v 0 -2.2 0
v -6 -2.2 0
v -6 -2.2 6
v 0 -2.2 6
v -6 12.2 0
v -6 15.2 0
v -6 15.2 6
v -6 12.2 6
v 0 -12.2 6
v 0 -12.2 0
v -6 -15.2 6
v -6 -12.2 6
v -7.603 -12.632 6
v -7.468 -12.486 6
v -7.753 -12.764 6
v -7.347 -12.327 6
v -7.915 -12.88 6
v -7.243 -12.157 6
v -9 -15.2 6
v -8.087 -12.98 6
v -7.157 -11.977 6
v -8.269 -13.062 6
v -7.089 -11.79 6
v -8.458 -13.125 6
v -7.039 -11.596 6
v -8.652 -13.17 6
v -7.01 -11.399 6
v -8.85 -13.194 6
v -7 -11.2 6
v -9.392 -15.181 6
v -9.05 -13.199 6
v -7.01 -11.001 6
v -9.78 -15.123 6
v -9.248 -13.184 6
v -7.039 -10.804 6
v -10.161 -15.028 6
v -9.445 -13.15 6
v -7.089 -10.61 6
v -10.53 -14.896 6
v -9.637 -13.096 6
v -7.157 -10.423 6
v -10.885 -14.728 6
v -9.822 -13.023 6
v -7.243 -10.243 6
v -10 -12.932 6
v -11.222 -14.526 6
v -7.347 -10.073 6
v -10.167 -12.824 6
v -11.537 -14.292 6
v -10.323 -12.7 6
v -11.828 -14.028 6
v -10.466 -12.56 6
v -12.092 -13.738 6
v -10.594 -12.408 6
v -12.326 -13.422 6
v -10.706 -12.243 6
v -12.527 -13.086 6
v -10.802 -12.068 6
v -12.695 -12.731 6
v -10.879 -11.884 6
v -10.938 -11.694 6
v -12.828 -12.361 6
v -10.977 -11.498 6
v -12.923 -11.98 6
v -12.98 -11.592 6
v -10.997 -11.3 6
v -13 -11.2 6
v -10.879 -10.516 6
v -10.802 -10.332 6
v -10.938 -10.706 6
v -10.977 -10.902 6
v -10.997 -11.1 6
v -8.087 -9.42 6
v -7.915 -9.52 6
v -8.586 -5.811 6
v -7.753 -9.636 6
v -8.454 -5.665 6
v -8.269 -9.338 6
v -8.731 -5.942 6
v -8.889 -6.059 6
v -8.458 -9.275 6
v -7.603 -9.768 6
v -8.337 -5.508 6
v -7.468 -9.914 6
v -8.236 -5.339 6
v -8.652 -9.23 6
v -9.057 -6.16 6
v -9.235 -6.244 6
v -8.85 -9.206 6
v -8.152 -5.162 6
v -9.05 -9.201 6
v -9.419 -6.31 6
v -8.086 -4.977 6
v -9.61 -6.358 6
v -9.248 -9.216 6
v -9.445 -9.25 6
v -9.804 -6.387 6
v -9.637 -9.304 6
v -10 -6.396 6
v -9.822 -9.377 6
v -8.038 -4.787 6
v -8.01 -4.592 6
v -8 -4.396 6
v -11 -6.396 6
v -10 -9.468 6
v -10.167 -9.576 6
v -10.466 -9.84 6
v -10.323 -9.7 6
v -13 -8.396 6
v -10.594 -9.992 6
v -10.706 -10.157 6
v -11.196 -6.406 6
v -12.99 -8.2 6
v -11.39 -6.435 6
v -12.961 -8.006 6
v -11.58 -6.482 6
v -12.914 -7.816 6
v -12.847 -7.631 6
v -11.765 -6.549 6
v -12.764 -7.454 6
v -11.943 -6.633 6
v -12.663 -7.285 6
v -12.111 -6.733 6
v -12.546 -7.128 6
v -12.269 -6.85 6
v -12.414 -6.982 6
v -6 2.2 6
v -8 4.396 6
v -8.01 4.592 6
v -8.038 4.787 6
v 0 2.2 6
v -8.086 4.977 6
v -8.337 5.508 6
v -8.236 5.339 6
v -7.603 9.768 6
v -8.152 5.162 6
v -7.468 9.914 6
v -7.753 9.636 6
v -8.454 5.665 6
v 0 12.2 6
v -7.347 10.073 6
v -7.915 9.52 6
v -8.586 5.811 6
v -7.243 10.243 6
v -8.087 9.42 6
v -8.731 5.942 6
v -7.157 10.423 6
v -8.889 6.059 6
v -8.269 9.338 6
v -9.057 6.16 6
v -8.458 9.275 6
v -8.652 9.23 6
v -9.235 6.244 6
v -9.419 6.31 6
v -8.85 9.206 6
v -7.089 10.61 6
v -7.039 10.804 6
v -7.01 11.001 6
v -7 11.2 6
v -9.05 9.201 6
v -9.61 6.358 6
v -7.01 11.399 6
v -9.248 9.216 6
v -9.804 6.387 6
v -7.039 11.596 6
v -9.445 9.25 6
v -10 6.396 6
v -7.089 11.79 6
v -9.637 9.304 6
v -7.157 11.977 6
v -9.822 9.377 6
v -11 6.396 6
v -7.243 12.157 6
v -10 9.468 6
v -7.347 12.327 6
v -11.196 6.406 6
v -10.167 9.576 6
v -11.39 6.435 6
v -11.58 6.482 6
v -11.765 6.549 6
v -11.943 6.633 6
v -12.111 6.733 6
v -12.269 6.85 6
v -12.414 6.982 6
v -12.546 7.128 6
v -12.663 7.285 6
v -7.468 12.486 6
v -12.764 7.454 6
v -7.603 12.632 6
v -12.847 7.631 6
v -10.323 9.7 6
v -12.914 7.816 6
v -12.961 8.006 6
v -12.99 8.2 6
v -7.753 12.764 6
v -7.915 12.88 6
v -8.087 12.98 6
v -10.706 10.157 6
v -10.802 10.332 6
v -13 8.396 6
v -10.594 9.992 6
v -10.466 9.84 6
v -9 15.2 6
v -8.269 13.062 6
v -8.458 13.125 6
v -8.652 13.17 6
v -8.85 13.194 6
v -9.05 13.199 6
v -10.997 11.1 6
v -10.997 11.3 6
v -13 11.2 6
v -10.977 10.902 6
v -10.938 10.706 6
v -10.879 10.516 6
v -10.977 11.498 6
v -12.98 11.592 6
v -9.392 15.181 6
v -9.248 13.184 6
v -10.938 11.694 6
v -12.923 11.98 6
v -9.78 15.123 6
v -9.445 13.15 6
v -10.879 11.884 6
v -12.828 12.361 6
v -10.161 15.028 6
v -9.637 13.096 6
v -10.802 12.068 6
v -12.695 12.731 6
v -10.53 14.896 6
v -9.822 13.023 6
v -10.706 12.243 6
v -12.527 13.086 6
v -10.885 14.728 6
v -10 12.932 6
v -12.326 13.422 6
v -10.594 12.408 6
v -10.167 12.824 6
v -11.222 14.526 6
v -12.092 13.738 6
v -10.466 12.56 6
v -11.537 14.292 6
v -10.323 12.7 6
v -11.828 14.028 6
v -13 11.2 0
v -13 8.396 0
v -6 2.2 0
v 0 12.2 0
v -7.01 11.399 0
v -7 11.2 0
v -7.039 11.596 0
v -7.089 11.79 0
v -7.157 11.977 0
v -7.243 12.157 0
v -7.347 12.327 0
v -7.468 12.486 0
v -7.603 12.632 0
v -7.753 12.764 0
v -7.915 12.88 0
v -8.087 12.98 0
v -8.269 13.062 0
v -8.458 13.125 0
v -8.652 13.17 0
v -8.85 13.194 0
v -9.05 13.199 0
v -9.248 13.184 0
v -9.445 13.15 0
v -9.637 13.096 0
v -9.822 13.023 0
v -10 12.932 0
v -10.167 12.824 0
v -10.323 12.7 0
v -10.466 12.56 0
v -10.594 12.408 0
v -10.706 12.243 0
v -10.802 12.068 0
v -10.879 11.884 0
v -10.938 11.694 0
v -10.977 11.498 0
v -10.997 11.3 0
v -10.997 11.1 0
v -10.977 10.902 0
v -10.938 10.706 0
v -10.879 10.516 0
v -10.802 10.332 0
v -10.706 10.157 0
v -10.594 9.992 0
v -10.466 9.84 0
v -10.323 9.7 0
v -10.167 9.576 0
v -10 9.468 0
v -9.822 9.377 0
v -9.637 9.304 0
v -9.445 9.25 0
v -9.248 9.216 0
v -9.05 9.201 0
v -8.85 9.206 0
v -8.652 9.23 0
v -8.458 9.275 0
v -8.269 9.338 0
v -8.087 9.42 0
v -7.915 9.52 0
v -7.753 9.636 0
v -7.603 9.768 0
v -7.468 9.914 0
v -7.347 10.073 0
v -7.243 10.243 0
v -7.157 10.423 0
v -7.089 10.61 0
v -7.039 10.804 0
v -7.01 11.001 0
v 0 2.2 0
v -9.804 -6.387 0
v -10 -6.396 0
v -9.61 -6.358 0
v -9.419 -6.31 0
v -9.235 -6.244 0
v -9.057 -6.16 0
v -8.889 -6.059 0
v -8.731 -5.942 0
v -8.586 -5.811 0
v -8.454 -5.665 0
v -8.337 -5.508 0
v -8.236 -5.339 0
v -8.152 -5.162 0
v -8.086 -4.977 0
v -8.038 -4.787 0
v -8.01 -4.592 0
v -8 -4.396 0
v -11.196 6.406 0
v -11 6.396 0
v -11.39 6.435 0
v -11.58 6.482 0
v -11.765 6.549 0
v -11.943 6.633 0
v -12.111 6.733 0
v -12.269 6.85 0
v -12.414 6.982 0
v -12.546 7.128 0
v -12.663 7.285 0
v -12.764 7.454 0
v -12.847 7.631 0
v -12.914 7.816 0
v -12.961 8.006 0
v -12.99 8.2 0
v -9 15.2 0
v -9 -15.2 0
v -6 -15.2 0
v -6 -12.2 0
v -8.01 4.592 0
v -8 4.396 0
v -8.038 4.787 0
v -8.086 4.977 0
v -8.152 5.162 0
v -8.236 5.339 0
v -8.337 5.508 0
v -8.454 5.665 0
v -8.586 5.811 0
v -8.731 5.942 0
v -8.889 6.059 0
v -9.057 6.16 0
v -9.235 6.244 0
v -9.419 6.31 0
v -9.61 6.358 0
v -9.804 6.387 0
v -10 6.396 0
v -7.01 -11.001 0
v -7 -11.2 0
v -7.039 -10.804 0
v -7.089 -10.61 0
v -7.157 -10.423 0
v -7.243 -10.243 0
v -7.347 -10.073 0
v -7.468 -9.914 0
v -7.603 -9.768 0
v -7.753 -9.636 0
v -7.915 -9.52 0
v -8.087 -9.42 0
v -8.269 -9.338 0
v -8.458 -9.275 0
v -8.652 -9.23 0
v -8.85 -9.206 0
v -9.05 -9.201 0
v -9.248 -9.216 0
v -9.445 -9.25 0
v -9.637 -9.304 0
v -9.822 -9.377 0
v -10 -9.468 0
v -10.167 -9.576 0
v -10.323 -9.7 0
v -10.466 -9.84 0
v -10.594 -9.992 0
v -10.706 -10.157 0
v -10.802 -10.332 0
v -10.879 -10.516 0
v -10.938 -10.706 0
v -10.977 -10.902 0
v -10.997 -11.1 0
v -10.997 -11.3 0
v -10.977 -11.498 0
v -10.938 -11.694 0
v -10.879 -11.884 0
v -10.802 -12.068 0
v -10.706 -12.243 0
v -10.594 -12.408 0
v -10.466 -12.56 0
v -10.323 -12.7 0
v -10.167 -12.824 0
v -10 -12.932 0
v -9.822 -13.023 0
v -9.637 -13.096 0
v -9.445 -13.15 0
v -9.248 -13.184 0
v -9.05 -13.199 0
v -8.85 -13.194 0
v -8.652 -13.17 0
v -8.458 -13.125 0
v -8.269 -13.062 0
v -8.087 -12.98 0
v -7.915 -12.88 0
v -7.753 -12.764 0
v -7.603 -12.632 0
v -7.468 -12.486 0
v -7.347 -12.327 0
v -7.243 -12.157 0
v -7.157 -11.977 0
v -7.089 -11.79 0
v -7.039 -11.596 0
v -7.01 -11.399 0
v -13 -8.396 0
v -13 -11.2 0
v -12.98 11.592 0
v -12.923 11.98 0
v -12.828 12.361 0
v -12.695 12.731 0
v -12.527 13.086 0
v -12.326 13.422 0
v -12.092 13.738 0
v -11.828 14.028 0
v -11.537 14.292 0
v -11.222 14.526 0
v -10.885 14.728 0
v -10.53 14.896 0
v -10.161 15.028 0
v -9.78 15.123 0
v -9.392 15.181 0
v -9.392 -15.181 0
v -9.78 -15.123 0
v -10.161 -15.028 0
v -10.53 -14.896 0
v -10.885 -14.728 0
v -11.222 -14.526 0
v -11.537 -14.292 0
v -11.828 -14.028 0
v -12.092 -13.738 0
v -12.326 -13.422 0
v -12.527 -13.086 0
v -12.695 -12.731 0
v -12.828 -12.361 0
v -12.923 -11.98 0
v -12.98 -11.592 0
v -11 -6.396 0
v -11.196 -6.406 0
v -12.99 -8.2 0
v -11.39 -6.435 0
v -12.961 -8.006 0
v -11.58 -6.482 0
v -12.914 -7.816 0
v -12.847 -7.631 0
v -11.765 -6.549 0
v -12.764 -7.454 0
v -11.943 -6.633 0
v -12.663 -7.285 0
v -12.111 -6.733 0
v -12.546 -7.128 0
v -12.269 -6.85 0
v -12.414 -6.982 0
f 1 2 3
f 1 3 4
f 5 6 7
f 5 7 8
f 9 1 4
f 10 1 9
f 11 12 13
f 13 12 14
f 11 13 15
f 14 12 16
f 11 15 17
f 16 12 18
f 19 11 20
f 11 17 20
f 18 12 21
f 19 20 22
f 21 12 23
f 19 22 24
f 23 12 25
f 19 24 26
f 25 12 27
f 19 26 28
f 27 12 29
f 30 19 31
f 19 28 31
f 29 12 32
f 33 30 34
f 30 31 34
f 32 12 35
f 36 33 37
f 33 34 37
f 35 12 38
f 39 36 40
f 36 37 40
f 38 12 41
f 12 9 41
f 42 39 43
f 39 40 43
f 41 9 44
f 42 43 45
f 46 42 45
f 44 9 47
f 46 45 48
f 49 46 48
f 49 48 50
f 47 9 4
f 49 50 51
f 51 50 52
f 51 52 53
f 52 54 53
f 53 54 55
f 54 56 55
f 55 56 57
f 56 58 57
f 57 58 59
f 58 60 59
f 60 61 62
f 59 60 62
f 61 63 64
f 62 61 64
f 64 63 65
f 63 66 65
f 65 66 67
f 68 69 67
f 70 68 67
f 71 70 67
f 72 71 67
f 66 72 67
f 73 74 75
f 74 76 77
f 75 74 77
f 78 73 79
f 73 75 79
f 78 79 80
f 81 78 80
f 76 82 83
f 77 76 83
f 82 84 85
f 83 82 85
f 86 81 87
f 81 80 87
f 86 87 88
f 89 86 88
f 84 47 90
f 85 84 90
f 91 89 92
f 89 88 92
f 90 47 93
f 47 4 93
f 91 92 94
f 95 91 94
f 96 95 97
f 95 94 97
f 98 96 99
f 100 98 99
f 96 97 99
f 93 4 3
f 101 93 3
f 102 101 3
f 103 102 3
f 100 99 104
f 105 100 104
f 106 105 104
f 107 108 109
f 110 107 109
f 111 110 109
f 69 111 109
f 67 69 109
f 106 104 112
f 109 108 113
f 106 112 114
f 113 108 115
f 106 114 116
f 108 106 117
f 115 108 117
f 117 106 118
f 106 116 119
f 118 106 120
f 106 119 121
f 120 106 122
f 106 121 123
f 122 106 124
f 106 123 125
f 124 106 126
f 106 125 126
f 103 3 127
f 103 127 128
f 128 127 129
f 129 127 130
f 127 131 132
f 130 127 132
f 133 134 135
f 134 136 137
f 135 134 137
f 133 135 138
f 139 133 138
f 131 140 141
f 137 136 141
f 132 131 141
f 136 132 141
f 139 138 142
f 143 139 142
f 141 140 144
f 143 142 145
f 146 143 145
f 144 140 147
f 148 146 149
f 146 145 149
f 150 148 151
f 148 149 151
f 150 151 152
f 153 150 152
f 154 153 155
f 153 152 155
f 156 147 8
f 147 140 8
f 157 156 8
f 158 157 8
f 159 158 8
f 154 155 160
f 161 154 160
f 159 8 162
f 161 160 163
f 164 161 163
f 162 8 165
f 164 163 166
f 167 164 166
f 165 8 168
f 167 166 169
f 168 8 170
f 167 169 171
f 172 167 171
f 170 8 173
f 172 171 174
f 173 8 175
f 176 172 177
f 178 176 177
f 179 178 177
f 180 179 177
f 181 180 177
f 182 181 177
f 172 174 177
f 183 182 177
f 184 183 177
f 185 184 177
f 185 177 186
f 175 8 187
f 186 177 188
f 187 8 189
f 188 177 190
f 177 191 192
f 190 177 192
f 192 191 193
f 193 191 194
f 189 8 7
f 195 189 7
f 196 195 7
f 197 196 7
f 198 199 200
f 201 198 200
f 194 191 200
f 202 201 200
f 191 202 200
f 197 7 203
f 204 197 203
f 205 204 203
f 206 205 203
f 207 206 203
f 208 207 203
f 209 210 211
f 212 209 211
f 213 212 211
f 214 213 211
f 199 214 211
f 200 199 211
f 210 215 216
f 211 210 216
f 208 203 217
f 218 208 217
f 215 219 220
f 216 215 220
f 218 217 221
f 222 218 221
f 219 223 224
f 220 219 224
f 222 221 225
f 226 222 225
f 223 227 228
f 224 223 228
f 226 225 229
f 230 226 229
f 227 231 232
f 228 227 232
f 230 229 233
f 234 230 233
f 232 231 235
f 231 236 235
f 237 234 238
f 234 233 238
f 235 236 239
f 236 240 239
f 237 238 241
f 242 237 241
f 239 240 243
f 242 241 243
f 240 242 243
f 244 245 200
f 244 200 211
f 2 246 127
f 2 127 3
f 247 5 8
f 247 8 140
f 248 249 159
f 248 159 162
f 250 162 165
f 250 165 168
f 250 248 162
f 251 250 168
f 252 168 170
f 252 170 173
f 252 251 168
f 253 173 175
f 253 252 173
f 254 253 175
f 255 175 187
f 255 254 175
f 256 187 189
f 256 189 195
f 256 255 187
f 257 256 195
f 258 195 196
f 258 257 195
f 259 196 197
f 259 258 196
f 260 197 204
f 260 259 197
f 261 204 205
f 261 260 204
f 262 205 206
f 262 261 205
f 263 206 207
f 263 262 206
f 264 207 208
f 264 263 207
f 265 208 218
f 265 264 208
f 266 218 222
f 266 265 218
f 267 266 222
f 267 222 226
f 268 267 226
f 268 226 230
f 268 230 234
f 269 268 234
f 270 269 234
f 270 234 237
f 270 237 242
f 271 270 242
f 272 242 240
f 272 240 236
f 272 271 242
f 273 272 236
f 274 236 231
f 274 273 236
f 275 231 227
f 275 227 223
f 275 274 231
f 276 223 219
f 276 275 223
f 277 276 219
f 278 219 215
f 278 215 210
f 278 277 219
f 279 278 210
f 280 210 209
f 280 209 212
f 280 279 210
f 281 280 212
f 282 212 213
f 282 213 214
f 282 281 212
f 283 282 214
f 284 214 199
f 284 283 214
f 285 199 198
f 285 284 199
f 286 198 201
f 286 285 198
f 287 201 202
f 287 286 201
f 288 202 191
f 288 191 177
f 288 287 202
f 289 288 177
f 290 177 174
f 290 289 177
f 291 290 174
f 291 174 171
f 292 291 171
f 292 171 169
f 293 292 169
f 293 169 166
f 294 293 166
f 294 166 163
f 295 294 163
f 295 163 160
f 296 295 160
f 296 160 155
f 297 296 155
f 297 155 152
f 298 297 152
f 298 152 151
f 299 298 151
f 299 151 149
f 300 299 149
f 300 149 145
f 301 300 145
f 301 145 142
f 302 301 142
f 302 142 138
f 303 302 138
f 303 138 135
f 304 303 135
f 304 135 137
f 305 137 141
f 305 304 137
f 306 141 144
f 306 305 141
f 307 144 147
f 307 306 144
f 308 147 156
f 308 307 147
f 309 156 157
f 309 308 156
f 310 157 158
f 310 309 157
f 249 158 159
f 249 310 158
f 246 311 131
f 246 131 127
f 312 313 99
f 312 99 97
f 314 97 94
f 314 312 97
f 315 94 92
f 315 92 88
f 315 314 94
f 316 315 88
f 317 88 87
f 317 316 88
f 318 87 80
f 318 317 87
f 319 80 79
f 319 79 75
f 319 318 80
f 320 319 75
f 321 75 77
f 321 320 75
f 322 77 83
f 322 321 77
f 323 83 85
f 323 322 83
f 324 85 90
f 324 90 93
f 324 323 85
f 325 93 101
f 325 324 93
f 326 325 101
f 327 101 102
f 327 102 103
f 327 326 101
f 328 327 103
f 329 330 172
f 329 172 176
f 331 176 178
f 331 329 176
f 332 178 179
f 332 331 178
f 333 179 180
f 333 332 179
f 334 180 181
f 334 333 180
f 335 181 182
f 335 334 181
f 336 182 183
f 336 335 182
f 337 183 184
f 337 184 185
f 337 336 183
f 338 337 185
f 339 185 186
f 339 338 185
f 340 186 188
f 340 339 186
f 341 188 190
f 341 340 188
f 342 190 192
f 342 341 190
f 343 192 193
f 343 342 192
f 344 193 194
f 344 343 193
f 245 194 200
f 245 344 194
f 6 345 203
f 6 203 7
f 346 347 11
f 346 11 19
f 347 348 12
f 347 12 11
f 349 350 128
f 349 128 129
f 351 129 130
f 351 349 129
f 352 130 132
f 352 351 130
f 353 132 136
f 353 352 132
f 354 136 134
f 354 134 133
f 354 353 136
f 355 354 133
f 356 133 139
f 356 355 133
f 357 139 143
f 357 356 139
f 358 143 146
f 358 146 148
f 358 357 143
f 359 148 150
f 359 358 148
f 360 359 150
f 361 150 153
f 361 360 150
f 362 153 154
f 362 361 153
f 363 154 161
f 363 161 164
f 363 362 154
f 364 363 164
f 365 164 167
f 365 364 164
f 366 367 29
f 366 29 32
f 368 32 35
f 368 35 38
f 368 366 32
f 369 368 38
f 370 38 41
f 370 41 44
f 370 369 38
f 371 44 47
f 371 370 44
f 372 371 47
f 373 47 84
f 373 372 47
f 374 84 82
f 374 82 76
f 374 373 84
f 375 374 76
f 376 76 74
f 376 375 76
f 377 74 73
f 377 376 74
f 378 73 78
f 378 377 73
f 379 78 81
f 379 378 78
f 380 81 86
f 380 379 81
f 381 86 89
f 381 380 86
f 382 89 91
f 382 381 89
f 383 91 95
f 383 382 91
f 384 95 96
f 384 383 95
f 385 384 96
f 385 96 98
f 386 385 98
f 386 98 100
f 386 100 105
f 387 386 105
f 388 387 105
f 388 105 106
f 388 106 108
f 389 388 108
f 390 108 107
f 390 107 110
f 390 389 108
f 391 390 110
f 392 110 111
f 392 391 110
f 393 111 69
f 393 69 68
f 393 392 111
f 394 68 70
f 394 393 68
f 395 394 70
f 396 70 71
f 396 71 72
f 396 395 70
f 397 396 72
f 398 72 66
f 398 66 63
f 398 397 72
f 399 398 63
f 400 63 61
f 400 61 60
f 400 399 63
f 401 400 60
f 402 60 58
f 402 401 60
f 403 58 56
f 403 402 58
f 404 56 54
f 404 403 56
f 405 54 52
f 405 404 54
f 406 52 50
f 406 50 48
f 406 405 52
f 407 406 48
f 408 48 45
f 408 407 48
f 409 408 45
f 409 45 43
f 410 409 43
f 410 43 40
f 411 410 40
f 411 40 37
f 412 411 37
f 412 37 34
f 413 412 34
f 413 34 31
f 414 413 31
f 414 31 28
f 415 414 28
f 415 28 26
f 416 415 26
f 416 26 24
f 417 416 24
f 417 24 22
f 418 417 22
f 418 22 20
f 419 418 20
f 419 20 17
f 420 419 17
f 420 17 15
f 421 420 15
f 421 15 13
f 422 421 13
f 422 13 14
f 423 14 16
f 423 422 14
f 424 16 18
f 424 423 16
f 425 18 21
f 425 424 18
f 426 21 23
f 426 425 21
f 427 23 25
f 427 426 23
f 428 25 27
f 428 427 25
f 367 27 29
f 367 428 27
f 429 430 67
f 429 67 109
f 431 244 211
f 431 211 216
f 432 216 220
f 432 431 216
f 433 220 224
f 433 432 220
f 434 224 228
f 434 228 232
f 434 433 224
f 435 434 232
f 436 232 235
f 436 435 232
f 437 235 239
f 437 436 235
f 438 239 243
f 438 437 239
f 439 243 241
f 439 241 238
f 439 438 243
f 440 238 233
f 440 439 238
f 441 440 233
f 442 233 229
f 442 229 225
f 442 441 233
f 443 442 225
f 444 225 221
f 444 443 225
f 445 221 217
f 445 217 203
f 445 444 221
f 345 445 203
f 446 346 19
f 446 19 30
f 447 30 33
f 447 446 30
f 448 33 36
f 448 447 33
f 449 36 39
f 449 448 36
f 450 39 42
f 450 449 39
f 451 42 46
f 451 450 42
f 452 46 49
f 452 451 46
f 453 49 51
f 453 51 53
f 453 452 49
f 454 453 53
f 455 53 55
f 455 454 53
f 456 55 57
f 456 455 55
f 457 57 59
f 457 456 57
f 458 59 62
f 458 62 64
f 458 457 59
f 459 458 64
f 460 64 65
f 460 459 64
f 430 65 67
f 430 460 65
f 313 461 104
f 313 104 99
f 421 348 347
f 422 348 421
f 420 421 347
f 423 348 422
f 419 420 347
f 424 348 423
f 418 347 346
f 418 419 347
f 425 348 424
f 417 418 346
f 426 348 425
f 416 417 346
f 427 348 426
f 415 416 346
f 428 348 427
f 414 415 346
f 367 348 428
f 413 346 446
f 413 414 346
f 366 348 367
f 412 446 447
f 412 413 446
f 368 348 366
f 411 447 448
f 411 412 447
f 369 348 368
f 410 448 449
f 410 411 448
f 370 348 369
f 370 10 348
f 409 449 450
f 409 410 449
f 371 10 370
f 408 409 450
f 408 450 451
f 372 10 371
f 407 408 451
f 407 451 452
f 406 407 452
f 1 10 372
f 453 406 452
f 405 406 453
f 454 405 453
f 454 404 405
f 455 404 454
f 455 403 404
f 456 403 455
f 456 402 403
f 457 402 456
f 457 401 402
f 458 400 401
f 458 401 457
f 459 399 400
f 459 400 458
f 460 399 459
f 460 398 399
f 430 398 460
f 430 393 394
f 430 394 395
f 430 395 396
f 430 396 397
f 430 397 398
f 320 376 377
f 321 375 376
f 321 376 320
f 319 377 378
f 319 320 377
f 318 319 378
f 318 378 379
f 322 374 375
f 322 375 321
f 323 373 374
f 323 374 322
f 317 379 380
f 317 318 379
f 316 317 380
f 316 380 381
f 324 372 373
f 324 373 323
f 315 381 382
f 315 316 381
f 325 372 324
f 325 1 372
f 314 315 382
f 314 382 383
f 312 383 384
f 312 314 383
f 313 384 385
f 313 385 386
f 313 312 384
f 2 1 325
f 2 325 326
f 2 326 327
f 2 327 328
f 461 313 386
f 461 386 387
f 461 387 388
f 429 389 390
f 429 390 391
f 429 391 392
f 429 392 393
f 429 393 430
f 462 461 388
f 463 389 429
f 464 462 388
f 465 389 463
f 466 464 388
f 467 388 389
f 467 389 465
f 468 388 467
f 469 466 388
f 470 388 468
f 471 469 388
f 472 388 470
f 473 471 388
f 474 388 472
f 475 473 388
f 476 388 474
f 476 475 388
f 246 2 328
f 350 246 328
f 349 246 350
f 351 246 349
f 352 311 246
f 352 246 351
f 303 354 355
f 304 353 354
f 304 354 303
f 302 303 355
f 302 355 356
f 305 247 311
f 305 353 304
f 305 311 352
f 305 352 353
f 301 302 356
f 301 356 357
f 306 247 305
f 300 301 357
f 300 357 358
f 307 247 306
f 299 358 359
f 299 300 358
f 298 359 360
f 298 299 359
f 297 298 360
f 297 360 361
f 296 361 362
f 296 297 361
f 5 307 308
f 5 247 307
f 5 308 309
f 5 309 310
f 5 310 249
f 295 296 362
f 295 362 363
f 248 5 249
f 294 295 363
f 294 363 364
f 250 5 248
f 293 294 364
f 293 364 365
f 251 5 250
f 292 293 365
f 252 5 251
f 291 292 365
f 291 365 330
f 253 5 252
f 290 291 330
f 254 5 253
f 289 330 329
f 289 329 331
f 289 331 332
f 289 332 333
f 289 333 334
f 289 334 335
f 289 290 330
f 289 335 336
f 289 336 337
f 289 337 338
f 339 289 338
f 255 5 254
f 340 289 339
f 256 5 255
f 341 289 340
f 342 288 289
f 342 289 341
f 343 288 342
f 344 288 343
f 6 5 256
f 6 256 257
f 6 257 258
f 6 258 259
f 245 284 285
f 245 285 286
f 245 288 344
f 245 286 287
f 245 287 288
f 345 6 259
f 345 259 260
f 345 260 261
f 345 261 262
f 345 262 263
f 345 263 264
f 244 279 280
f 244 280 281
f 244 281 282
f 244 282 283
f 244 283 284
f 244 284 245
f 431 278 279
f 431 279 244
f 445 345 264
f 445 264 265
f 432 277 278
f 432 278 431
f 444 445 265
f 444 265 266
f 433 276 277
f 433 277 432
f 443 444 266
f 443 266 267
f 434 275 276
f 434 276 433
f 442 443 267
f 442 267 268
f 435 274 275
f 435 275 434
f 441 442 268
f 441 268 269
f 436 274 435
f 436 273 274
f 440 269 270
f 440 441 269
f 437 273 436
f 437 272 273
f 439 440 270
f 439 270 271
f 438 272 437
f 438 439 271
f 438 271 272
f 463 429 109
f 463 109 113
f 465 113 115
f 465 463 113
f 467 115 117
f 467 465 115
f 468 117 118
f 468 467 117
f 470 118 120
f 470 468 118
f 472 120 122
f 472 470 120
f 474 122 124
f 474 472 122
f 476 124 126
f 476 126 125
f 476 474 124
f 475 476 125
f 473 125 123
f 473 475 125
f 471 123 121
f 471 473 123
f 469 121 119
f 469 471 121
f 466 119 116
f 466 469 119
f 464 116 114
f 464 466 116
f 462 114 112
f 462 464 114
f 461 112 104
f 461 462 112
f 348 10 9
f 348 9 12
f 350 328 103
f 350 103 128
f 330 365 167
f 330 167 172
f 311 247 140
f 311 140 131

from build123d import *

# Parameters (mm, degrees)
ESQUISSE1_R        = 2
BOSS_EXTRU_1_DEPTH = 6


with BuildPart() as part:
    # Esquisse1 → Boss.-Extru.1 (new body)
    with BuildSketch(Plane.XY):
        with BuildLine():
            Line((-8.999739216, 15.2), (-5.999739216, 15.2))
            Line((-5.999739216, 15.2), (-5.999739216, 12.2))
            Line((-5.999739216, 12.2), (0.000260784, 12.2))
            Line((0.000260784, 12.2), (0, 2.2))
            Line((0, 2.2), (-5.999739216, 2.2))
            Line((-5.999739216, 2.2), (-5.999739216, -2.2))
            Line((-5.999739216, -2.2), (0.000260784, -2.2))
            Line((0.000260784, -2.2), (0.000260784, -12.2))
            Line((0.000260784, -12.2), (-5.999739216, -12.2))
            Line((-5.999739216, -12.2), (-5.999739216, -15.2))
            Line((-5.999739216, -15.2), (-8.999739216, -15.2))
            ThreePointArc((-8.999739216, -15.2), (-11.82816634, -14.028427125), (-12.999739216, -11.2))
            Line((-12.999739216, -11.2), (-12.999739216, -8.39638009))
            ThreePointArc((-12.999739216, -8.39638009), (-12.413952778, -6.982166528), (-10.999739216, -6.39638009))
            Line((-10.999739216, -6.39638009), (-10, -6.39638009))
            ThreePointArc((-10, -6.39638009), (-8.585786438, -5.810593653), (-8, -4.39638009))
            Line((-8, -4.39638009), (-8, 4.39638009))
            ThreePointArc((-8, 4.39638009), (-8.585786438, 5.810593653), (-10, 6.39638009))
            Line((-10, 6.39638009), (-10.999739216, 6.39638009))
            ThreePointArc((-10.999739216, 6.39638009), (-12.413952778, 6.982166528), (-12.999739216, 8.39638009))
            Line((-12.999739216, 8.39638009), (-12.999739216, 11.2))
            ThreePointArc((-12.999739216, 11.2), (-11.82816634, 14.028427125), (-8.999739216, 15.2))
        make_face()
        with Locations((-8.999739216, 11.2)):
            Circle(ESQUISSE1_R, mode=Mode.SUBTRACT)
        with Locations((-8.999739216, -11.2)):
            Circle(ESQUISSE1_R, mode=Mode.SUBTRACT)
    extrude(amount=BOSS_EXTRU_1_DEPTH)


solid = part.part
